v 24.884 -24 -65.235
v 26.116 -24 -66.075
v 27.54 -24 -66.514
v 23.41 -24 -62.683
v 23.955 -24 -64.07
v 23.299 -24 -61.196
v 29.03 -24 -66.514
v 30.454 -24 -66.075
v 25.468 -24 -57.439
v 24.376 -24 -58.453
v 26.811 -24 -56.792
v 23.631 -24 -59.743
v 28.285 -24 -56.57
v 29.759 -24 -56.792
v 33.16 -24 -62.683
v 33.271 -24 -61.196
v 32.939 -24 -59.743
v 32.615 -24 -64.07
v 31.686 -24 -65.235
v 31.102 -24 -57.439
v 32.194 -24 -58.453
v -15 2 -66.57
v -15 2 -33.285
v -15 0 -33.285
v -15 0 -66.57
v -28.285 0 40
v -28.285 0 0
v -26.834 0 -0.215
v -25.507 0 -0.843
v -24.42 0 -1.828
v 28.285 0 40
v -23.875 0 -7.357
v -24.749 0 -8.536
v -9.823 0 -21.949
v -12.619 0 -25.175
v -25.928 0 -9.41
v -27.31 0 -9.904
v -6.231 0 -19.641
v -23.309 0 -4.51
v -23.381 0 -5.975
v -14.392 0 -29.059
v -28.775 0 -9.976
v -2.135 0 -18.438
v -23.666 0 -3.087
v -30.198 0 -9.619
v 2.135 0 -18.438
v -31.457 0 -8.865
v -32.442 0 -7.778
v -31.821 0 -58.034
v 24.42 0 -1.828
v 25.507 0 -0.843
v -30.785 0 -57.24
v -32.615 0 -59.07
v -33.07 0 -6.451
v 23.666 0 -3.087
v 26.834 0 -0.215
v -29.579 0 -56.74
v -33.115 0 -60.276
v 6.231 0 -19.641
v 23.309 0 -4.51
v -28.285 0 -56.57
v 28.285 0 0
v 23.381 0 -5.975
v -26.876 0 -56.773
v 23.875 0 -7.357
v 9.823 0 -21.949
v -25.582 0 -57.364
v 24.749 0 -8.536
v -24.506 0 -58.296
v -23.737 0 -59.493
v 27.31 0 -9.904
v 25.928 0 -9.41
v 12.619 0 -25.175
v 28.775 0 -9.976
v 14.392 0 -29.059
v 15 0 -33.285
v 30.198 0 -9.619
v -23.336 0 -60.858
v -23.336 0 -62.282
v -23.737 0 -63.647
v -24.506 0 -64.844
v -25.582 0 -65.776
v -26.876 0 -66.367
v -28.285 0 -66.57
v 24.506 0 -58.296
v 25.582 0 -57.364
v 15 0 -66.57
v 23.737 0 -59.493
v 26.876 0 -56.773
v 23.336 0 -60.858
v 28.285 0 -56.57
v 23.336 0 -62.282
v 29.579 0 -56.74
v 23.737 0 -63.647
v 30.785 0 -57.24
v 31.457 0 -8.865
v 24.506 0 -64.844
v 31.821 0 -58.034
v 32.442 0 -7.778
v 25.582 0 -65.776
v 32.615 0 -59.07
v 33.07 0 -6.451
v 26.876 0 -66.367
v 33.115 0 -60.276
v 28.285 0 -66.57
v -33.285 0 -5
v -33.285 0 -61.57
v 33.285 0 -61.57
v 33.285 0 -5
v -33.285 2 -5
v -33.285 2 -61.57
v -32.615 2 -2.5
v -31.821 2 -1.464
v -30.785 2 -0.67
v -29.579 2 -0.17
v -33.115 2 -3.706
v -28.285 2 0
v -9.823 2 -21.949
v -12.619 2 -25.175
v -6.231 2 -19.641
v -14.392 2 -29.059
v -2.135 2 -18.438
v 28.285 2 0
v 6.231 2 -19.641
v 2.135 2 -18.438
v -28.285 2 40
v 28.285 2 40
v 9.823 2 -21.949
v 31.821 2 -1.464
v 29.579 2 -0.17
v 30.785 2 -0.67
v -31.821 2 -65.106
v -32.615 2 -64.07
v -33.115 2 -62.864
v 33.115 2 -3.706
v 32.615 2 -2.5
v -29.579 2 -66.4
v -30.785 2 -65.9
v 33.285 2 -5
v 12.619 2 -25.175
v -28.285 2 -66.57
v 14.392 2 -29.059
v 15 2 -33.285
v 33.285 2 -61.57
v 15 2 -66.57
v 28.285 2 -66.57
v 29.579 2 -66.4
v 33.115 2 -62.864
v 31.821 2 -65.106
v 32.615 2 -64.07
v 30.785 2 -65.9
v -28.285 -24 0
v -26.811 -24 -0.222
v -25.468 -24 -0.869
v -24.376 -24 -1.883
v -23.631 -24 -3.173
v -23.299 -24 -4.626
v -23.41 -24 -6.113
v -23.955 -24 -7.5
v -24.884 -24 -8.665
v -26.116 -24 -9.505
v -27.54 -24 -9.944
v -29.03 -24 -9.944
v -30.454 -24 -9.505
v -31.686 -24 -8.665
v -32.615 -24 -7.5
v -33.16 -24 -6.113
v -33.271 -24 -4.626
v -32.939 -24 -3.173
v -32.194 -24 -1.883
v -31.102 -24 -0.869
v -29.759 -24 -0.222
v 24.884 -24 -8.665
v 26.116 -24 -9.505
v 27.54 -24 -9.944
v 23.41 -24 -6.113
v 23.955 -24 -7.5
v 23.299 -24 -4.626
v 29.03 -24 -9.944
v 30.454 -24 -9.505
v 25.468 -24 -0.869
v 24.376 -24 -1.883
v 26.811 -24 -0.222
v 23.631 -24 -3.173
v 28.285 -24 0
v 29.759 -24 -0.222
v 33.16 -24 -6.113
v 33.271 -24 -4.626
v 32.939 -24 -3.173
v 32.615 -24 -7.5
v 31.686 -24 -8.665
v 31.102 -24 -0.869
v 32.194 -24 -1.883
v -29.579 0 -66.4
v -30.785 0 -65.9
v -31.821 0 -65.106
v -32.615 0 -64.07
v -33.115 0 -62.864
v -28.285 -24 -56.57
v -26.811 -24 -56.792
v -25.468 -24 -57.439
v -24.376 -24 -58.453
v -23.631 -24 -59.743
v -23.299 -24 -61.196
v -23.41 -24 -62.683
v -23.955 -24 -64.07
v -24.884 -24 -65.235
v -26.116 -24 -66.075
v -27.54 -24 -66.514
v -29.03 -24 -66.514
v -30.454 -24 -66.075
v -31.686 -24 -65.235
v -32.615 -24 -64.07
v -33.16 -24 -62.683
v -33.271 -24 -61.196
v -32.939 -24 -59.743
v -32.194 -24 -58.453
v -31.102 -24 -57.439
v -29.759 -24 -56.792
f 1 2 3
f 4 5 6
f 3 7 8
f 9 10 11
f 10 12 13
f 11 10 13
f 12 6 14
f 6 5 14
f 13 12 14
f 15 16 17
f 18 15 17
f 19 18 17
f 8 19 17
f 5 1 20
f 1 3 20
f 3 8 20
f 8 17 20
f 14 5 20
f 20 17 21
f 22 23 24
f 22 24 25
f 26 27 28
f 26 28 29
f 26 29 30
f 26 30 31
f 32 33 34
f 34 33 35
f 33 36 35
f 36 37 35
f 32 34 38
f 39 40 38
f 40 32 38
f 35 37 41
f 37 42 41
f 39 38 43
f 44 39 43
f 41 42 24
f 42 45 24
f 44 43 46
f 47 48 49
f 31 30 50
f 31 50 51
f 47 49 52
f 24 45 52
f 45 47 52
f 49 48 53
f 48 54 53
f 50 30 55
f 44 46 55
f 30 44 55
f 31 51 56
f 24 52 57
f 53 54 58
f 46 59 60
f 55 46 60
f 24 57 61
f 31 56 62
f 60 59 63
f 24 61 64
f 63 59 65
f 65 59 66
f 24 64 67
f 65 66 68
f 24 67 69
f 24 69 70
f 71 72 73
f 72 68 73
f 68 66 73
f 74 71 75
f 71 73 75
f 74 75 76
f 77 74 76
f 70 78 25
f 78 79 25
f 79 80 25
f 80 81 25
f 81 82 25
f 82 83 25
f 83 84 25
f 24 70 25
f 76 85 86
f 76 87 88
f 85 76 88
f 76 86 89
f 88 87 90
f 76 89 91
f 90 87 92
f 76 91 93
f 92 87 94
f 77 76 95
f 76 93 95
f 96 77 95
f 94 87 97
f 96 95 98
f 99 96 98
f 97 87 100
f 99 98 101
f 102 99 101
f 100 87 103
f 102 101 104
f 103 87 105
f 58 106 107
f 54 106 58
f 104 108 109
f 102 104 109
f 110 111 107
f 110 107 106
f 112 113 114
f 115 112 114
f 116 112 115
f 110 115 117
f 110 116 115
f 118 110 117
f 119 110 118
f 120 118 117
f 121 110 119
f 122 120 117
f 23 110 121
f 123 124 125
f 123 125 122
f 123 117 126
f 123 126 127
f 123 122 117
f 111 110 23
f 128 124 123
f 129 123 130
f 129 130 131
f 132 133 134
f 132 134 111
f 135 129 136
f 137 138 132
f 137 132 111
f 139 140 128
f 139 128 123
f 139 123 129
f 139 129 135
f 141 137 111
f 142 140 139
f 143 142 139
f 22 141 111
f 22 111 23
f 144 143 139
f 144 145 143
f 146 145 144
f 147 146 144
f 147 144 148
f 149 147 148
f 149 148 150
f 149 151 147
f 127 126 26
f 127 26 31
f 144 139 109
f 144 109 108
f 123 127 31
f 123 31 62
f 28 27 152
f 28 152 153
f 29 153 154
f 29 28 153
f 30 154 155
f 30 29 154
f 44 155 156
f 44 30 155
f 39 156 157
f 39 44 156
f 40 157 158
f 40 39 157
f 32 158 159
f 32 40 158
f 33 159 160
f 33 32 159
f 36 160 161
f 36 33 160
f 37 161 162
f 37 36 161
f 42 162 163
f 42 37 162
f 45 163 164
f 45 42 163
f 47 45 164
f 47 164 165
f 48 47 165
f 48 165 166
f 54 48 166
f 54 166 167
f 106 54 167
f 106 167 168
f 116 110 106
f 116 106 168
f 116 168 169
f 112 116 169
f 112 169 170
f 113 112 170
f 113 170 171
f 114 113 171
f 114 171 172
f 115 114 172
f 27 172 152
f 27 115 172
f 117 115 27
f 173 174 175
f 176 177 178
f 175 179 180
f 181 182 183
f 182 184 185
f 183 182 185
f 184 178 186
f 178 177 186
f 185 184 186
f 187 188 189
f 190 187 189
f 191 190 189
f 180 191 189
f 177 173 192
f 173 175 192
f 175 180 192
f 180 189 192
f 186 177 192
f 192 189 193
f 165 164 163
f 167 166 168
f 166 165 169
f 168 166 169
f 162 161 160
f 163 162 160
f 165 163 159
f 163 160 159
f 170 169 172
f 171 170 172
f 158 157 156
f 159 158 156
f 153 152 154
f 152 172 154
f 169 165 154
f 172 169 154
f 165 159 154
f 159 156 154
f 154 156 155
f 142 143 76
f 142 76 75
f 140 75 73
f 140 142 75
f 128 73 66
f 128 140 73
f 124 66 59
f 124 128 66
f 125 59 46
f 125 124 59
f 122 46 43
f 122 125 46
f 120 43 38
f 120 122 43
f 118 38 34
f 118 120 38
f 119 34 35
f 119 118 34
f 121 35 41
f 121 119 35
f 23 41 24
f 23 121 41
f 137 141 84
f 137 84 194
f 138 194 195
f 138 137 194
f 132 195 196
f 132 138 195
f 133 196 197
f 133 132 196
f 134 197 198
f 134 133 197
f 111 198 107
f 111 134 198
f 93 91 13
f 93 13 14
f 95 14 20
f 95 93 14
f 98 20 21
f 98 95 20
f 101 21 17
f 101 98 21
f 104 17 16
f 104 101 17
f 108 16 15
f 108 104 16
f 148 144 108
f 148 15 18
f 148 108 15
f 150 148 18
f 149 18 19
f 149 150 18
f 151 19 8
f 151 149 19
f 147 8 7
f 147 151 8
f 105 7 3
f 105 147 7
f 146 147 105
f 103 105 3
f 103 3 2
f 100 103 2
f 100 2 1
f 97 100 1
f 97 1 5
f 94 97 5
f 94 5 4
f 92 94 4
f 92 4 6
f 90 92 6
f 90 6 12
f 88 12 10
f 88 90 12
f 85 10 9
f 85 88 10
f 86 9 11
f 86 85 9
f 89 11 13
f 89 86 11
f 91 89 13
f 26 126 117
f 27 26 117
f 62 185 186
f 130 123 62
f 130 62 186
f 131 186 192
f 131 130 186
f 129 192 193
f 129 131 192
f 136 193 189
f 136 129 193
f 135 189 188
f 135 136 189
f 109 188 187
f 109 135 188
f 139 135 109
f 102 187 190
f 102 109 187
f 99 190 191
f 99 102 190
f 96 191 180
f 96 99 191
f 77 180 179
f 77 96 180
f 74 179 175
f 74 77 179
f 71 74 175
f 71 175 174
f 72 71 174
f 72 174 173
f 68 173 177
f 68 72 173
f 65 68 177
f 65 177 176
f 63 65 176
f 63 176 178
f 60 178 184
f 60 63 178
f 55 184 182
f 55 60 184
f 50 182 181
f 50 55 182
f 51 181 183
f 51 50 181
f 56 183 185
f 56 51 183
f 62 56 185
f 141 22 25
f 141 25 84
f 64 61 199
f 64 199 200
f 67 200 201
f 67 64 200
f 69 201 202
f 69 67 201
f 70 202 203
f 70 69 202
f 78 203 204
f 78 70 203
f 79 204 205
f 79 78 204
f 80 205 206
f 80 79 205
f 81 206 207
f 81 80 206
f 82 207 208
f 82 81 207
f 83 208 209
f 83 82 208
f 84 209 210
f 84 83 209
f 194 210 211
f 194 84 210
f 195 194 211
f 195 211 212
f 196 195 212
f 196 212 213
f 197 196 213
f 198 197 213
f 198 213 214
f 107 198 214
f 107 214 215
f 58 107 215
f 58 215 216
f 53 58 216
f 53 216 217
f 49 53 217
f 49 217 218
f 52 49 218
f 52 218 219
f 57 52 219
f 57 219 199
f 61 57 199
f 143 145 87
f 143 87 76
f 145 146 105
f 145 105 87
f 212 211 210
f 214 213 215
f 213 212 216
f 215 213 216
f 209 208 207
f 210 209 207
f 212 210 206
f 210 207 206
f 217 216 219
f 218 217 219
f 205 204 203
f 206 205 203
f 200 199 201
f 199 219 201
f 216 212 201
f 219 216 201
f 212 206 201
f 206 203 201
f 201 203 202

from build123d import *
from build123d.topology import SkipClean

# Parameters (mm, degrees)
SKETCH1_R             = 5
BOSS_EXTRUDE1_DEPTH   = 24
BOSS_EXTRUDE1_2_DEPTH = 24
BOSS_EXTRUDE1_3_DEPTH = 24
BOSS_EXTRUDE1_4_DEPTH = 24
BOSS_EXTRUDE3_START   = 2
BOSS_EXTRUDE3_DEPTH   = 2


with BuildPart() as part:
    # Sketch1 → Boss-Extrude1 (new body)
    with BuildSketch(Plane(origin=(0, 0, 0), x_dir=(1, 0, 0), z_dir=(0, 1, 0))):
        with Locations((-28.285, 61.57)):
            Circle(SKETCH1_R)
    extrude(amount=-BOSS_EXTRUDE1_DEPTH)



with BuildPart() as body_2:
    # Sketch1 → Boss-Extrude1 2 (new body)
    with BuildSketch(Plane(origin=(0, 0, 0), x_dir=(1, 0, 0), z_dir=(0, 1, 0))):
        with Locations((28.285, 61.57)):
            Circle(SKETCH1_R)
    extrude(amount=-BOSS_EXTRUDE1_2_DEPTH)


with BuildPart() as body_3:
    # Sketch1 → Boss-Extrude1 3 (new body)
    with BuildSketch(Plane(origin=(0, 0, 0), x_dir=(1, 0, 0), z_dir=(0, 1, 0))):
        with Locations((-28.285, 5)):
            Circle(SKETCH1_R)
    extrude(amount=-BOSS_EXTRUDE1_3_DEPTH)


with BuildPart() as body_4:
    # Sketch1 → Boss-Extrude1 4 (new body)
    with BuildSketch(Plane(origin=(0, 0, 0), x_dir=(1, 0, 0), z_dir=(0, 1, 0))):
        with Locations((28.285, 5)):
            Circle(SKETCH1_R)
    extrude(amount=-BOSS_EXTRUDE1_4_DEPTH)


with BuildPart() as part_1:
    with SkipClean():  # the faces are left unmerged after this step: merging them gives an invalid solid
        add(part.part)

        add(body_2.part)  # Boss-Extrude3 merges body 2

        add(body_3.part)  # Boss-Extrude3 merges body 3

        add(body_4.part)  # Boss-Extrude3 merges body 4
        # Sketch1<5> → Boss-Extrude3 (add)
        with BuildSketch(Plane(origin=(0, 0, 0), x_dir=(1, 0, 0), z_dir=(0, 1, 0)).offset(BOSS_EXTRUDE3_START)):
            with BuildLine():
                ThreePointArc((15, 33.285), (0, 18.285), (-15, 33.285))
                Line((-15, 33.285), (-15, 66.57))
                Line((-15, 66.57), (-28.285, 66.57))
                ThreePointArc((-28.285, 66.57), (-31.820533906, 65.105533906), (-33.285, 61.57))
                Line((-33.285, 61.57), (-33.285, 5))
                ThreePointArc((-33.285, 5), (-31.820533906, 1.464466094), (-28.285, 0))
                Line((-28.285, 0), (-28.285, -40))
                Line((-28.285, -40), (28.285, -40))
                Line((28.285, -40), (28.285, 0))
                ThreePointArc((28.285, 0), (31.820533906, 1.464466094), (33.285, 5))
                Line((33.285, 5), (33.285, 61.57))
                ThreePointArc((33.285, 61.57), (31.820533906, 65.105533906), (28.285, 66.57))
                Line((28.285, 66.57), (15, 66.57))
                Line((15, 66.57), (15, 33.285))
            make_face()
        extrude(amount=-BOSS_EXTRUDE3_DEPTH)


solid = part_1.part
